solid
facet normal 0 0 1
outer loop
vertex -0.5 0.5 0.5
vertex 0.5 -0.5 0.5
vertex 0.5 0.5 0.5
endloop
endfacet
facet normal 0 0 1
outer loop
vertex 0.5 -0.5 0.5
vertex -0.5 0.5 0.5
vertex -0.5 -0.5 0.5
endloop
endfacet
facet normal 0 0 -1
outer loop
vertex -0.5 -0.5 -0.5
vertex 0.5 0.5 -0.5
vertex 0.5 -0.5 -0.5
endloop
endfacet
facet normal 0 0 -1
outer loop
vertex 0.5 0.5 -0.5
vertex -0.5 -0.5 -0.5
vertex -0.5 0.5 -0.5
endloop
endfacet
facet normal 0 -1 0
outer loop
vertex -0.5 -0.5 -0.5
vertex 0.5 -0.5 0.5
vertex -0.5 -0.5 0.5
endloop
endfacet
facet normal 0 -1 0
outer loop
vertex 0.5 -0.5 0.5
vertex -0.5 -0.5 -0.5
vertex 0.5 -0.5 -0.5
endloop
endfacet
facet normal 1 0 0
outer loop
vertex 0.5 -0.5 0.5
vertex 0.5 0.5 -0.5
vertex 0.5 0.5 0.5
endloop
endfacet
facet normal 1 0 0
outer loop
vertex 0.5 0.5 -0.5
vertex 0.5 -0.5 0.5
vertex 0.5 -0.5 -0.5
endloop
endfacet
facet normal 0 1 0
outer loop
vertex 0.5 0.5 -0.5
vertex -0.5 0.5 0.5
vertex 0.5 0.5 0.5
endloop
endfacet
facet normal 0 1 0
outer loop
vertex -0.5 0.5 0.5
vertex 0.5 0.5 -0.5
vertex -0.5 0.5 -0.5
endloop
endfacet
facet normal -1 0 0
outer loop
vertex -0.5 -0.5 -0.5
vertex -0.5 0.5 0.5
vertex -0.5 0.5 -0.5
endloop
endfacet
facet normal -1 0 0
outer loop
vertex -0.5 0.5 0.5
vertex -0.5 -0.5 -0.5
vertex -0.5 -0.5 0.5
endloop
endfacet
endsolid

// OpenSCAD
module ear()
{
  we = dxf_dim(file="futaba-ears.dxf", name="we");
  rd = dxf_dim(file="futaba-ears.dxf", name="rd");
  xd = dxf_dim(file="futaba-ears.dxf", name="xd");
  yd = dxf_dim(file="futaba-ears.dxf", name="yd");
  we2= dxf_dim(file="futaba-ears2.dxf", name="we2");

  difference() {
    union() {
     dxf_linear_extrude(file="futaba-ears.dxf", layer="exterior", height=we);
      translate([0,we2/2,we])
      rotate(a=90, v=[1,0,0])
      dxf_linear_extrude(file="futaba-ears2.dxf", layer="exterior", height=we2);
    }

    translate([-xd,yd,0])
      cylinder(r=rd, h=we+10, $fn=16,center=true);
    translate([-xd,-yd,0])
      cylinder(r=rd, h=we+10, $fn=16,center=true);
  }
}

module futaba() 
{
  z1 = dxf_dim(file="futaba-main.dxf", name="z1");
  x1 = dxf_dim(file="futaba-main.dxf", name="x1");
  y1 = dxf_dim(file="futaba-main.dxf", name="y1");
  ht  = dxf_dim(file="futaba-top.dxf", name="ht");
  xs = dxf_dim(file="futaba-main.dxf",name="xs");
  he = dxf_dim(file="futaba-main.dxf",name="he");



  union() {
    //-- Main part
    translate([0,0,z1/2])
    cube(size=[x1,y1,z1], center=true);

    //-- Top part
    translate([0,0,z1])
    rotate (a=90, v=[1,0,0])
    linear_extrude(file="futaba-top.dxf", height=y1, center=true);

   //-- Shaft part
    translate ([xs,0,z1+ht]) dxf_rotate_extrude(file="futaba-shaft.dxf", layer="section");

  }

  translate([-x1/2,0,he]) ear();
  translate([x1/2,0,he]) 
    rotate(a=180, v=[0,0,1]) ear();

}


futaba();
